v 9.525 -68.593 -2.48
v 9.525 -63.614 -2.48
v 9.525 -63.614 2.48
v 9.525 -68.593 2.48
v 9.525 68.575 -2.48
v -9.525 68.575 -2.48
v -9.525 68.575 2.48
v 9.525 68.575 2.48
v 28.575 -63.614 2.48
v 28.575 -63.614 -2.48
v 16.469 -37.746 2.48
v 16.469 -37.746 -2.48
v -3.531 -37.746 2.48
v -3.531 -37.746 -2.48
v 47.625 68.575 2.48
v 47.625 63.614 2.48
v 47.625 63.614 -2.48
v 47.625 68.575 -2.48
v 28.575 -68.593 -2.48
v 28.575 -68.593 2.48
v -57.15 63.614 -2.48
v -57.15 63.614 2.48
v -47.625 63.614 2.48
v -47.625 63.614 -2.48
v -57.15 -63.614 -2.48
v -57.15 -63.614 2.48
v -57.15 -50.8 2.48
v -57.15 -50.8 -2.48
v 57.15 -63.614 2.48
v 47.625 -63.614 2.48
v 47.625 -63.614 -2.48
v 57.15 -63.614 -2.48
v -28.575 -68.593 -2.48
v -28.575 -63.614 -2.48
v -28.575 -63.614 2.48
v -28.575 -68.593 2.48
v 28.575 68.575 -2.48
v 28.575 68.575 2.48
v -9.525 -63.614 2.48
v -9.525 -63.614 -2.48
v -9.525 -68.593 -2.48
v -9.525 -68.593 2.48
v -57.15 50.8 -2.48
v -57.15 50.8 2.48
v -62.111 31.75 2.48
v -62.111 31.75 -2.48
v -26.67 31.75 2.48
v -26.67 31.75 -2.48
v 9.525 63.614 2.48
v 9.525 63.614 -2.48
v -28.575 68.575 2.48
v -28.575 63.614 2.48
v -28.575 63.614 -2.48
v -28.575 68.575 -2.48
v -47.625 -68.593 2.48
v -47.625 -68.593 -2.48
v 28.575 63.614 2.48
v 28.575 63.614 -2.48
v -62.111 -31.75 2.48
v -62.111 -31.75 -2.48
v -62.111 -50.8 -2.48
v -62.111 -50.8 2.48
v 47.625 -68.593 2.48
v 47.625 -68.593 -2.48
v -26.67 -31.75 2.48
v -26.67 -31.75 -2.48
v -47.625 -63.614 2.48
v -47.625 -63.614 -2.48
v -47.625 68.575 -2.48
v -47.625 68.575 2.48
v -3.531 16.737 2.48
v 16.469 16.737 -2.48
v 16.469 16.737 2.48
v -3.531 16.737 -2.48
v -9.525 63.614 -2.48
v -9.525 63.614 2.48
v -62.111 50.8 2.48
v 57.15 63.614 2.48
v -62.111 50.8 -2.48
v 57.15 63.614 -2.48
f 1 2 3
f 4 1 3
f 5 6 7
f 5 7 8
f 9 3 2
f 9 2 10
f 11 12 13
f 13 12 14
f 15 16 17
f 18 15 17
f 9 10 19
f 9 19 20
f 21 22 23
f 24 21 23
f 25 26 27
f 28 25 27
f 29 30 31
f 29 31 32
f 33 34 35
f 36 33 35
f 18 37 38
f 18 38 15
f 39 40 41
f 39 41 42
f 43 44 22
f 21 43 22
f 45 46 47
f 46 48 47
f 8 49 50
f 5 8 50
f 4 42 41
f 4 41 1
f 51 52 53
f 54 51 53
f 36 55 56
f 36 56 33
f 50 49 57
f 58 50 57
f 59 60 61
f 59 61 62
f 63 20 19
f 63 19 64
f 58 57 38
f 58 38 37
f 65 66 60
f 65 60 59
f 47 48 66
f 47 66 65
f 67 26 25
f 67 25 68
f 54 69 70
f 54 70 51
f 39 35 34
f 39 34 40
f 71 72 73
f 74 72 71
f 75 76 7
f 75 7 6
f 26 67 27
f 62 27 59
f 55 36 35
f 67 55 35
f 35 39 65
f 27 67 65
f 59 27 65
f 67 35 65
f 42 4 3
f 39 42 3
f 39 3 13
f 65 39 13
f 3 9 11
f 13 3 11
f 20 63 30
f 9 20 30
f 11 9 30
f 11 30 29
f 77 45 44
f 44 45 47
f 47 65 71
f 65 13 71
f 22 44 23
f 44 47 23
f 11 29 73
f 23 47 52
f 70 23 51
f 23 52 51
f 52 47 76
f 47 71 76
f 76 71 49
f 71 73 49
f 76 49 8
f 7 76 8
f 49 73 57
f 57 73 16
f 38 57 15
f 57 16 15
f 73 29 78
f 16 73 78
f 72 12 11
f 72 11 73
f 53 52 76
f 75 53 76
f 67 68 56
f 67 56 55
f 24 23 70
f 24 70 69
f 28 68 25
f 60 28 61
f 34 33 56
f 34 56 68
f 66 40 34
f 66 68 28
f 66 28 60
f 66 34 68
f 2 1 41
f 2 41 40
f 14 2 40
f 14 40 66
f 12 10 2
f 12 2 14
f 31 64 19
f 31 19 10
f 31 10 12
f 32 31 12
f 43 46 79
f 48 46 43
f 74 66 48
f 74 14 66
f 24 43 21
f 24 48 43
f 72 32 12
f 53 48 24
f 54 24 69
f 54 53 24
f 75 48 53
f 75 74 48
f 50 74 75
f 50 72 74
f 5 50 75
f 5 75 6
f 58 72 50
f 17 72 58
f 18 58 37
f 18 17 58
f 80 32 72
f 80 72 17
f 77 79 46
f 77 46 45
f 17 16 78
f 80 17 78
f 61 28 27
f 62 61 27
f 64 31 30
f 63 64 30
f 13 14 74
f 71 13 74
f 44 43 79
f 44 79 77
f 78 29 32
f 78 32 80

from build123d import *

# Parameters (mm, degrees)
SKETCH1_W           = 114.3
SKETCH1_H           = 127.2286
BOSS_EXTRUDE1_DEPTH = 2.48046875
SKETCH3_W           = 19.05
SKETCH3_H           = 4.9609375
BOSS_EXTRUDE2_DEPTH = 4.9609375
SKETCH5_W           = 19.05
SKETCH5_H           = 4.9609375
BOSS_EXTRUDE3_DEPTH = 4.9784
SKETCH7_W           = 4.9609375
SKETCH7_H           = 63.5
CUT_EXTRUDE1_DEPTH  = 30.48
SKETCH6_W           = 4.9609375
SKETCH6_H           = 19.05
BOSS_EXTRUDE4_DEPTH = 4.9609375
CAVITY1_START       = -3.0309375
CAVITY1_2_OUTLINE_W = 41
CAVITY1_2_OUTLINE_H = 4.9609375
CAVITY1_2_DEPTH     = 19
CAVITY1_START_2     = -2.3309375
CAVITY1_3_DEPTH     = 17.6
CAVITY1_START_3     = -3
CAVITY1_4_DEPTH     = 6
CAVITY1_START_4     = 0.91953125
CAVITY1_6_OUTLINE_R = 3
CAVITY1_6_DEPTH     = 1.5609375
SKETCH9_W           = 20
SKETCH9_H           = 54.483
CUT_EXTRUDE2_DEPTH  = 93.827315363


with BuildPart() as part:
    # Sketch1 → Boss-Extrude1 (new, symmetric)
    with BuildSketch(Plane.XY):
        Rectangle(SKETCH1_W, SKETCH1_H)
    extrude(amount=BOSS_EXTRUDE1_DEPTH, both=True)

    # Sketch3 → Boss-Extrude2 (add)
    with BuildSketch(Plane(origin=(0, 63.6143, 0), x_dir=(1, 0, 0), z_dir=(0, 1, 0))):
        with Locations((38.1, 0)):
            Rectangle(SKETCH3_W, SKETCH3_H)
        Rectangle(SKETCH3_W, SKETCH3_H)
        with Locations((-38.1, 0)):
            Rectangle(SKETCH3_W, SKETCH3_H)
    extrude(amount=BOSS_EXTRUDE2_DEPTH)

    # Sketch5 → Boss-Extrude3 (add)
    with BuildSketch(Plane.XZ.offset(63.6143)):
        Rectangle(SKETCH5_W, SKETCH5_H)
        with Locations((38.1, 0)):
            Rectangle(SKETCH5_W, SKETCH5_H)
        with Locations((-38.1, 0)):
            Rectangle(SKETCH5_W, SKETCH5_H)
    extrude(amount=BOSS_EXTRUDE3_DEPTH)

    # Sketch7 → Cut-Extrude1 (cut)
    with BuildSketch(Plane.ZY.offset(57.15)):
        Rectangle(SKETCH7_W, SKETCH7_H)
    extrude(amount=-CUT_EXTRUDE1_DEPTH, mode=Mode.SUBTRACT)

    # Sketch6 → Boss-Extrude4 (add)
    with BuildSketch(Plane.ZY.offset(57.15)):
        with Locations((0, 41.275)):
            Rectangle(SKETCH6_W, SKETCH6_H)
        with Locations((0, -41.275)):
            Rectangle(SKETCH6_W, SKETCH6_H)
    extrude(amount=BOSS_EXTRUDE4_DEPTH)

    # Cavity1: read off the stored shape, not the designer's step
    # Cavity1 outline → Cavity1 (revolve, cut)
    with BuildSketch(Plane(origin=(15.2690625, 0, -2.53046875), x_dir=(1, 0, 0), z_dir=(0, 0, 1))):
        with BuildLine():
            ThreePointArc((0.05, -31.0547625), (0.064644661, -31.019407161), (0.1, -31.0047625))
            Line((0.1, -31.0047625), (0.1, 9.9952375))
            ThreePointArc((0.1, 9.9952375), (0.064644661, 10.009882161), (0.05, 10.0452375))
            Line((0.05, 10.0452375), (0.05, -31.0547625))
        make_face()
    revolve(axis=Axis((15.2690625, 0, -2.53046875), (0, 1, 0)), mode=Mode.SUBTRACT)

    # Cavity1 2 outline → Cavity1 2 (cut)
    with BuildSketch(Plane.YZ.offset(CAVITY1_START)):
        with Locations((-10.5047625, 0)):
            Rectangle(CAVITY1_2_OUTLINE_W, CAVITY1_2_OUTLINE_H)
    extrude(amount=CAVITY1_2_DEPTH, mode=Mode.SUBTRACT)

    # Cavity1 3 outline → Cavity1 3 (cut)
    with BuildSketch(Plane.YZ.offset(CAVITY1_START_2)):
        with BuildLine():
            ThreePointArc((-31.0047625, -2.43046875), (-31.019407161, -2.465824089), (-31.0547625, -2.48046875))
            Line((-31.0547625, -2.48046875), (-31.0047625, -2.48046875))
            Line((-31.0047625, -2.48046875), (-31.0047625, -2.43046875))
        make_face()
        with BuildLine():
            Line((9.9952375, -2.43046875), (9.9952375, -2.48046875))
            Line((9.9952375, -2.48046875), (10.0452375, -2.48046875))
            ThreePointArc((10.0452375, -2.48046875), (10.009882161, -2.465824089), (9.9952375, -2.43046875))
        make_face()
    extrude(amount=CAVITY1_3_DEPTH, mode=Mode.SUBTRACT)

    # Cavity1 4 outline → Cavity1 4 (cut)
    with BuildSketch(Plane.XY.offset(CAVITY1_START_3)):
        with BuildLine():
            ThreePointArc((15.9690625, -31.0047625), (16.322615891, -30.858315891), (16.4690625, -30.5047625))
            Line((16.4690625, -30.5047625), (16.4690625, 9.4952375))
            ThreePointArc((16.4690625, 9.4952375), (16.322615891, 9.848790891), (15.9690625, 9.9952375))
            Line((15.9690625, 9.9952375), (15.9690625, -31.0047625))
        make_face()
        with BuildLine():
            ThreePointArc((-3.0309375, 9.9952375), (-3.384490891, 9.848790891), (-3.5309375, 9.4952375))
            Line((-3.5309375, 9.4952375), (-3.5309375, -30.5047625))
            ThreePointArc((-3.5309375, -30.5047625), (-3.384490891, -30.858315891), (-3.0309375, -31.0047625))
            Line((-3.0309375, -31.0047625), (-3.0309375, 9.9952375))
        make_face()
    extrude(amount=CAVITY1_4_DEPTH, mode=Mode.SUBTRACT)

    # Cavity1 5 outline → Cavity1 5 (revolve, cut)
    with BuildSketch(Plane(origin=(-2.3309375, 0, -2.53046875), x_dir=(1, 0, 0), z_dir=(0, 0, 1))):
        with BuildLine():
            ThreePointArc((0.05, -31.0547625), (0.064644661, -31.019407161), (0.1, -31.0047625))
            Line((0.1, -31.0047625), (0.05, -31.0047625))
            Line((0.05, -31.0047625), (0.05, -31.0547625))
        make_face()
        with BuildLine():
            Line((0.05, 9.9952375), (0.1, 9.9952375))
            ThreePointArc((0.1, 9.9952375), (0.064644661, 10.009882161), (0.05, 10.0452375))
            Line((0.05, 10.0452375), (0.05, 9.9952375))
        make_face()
    revolve(axis=Axis((-2.3309375, 0, -2.53046875), (0, 1, 0)), mode=Mode.SUBTRACT)


with BuildPart() as body_2:
    # Cavity1 6 outline → Cavity1 6 (new body)
    with BuildSketch(Plane.XY.offset(CAVITY1_START_4)):
        with Locations((6.4690625, -0.0047625)):
            Circle(CAVITY1_6_OUTLINE_R)
    extrude(amount=CAVITY1_6_DEPTH)


with BuildPart() as cut_extrude2_tool:
    # Sketch9 → Cut-Extrude2 (new, through all)
    with BuildSketch(Plane(origin=(0, 0, -4.88046875), x_dir=(-1, 0, 0), z_dir=(0, 0, -1))):
        with Locations((-6.4690625, -10.5047625)):
            Rectangle(SKETCH9_W, SKETCH9_H)
    extrude(amount=-CUT_EXTRUDE2_DEPTH)


with BuildPart() as part_1:
    add(part.part)

    # Cut-Extrude2: cut by cut_extrude2_tool
    add(cut_extrude2_tool.part, mode=Mode.SUBTRACT)


with BuildPart() as body_2_1:
    add(body_2.part)

    # Cut-Extrude2: cut by cut_extrude2_tool
    add(cut_extrude2_tool.part, mode=Mode.SUBTRACT)


solid = part_1.part
